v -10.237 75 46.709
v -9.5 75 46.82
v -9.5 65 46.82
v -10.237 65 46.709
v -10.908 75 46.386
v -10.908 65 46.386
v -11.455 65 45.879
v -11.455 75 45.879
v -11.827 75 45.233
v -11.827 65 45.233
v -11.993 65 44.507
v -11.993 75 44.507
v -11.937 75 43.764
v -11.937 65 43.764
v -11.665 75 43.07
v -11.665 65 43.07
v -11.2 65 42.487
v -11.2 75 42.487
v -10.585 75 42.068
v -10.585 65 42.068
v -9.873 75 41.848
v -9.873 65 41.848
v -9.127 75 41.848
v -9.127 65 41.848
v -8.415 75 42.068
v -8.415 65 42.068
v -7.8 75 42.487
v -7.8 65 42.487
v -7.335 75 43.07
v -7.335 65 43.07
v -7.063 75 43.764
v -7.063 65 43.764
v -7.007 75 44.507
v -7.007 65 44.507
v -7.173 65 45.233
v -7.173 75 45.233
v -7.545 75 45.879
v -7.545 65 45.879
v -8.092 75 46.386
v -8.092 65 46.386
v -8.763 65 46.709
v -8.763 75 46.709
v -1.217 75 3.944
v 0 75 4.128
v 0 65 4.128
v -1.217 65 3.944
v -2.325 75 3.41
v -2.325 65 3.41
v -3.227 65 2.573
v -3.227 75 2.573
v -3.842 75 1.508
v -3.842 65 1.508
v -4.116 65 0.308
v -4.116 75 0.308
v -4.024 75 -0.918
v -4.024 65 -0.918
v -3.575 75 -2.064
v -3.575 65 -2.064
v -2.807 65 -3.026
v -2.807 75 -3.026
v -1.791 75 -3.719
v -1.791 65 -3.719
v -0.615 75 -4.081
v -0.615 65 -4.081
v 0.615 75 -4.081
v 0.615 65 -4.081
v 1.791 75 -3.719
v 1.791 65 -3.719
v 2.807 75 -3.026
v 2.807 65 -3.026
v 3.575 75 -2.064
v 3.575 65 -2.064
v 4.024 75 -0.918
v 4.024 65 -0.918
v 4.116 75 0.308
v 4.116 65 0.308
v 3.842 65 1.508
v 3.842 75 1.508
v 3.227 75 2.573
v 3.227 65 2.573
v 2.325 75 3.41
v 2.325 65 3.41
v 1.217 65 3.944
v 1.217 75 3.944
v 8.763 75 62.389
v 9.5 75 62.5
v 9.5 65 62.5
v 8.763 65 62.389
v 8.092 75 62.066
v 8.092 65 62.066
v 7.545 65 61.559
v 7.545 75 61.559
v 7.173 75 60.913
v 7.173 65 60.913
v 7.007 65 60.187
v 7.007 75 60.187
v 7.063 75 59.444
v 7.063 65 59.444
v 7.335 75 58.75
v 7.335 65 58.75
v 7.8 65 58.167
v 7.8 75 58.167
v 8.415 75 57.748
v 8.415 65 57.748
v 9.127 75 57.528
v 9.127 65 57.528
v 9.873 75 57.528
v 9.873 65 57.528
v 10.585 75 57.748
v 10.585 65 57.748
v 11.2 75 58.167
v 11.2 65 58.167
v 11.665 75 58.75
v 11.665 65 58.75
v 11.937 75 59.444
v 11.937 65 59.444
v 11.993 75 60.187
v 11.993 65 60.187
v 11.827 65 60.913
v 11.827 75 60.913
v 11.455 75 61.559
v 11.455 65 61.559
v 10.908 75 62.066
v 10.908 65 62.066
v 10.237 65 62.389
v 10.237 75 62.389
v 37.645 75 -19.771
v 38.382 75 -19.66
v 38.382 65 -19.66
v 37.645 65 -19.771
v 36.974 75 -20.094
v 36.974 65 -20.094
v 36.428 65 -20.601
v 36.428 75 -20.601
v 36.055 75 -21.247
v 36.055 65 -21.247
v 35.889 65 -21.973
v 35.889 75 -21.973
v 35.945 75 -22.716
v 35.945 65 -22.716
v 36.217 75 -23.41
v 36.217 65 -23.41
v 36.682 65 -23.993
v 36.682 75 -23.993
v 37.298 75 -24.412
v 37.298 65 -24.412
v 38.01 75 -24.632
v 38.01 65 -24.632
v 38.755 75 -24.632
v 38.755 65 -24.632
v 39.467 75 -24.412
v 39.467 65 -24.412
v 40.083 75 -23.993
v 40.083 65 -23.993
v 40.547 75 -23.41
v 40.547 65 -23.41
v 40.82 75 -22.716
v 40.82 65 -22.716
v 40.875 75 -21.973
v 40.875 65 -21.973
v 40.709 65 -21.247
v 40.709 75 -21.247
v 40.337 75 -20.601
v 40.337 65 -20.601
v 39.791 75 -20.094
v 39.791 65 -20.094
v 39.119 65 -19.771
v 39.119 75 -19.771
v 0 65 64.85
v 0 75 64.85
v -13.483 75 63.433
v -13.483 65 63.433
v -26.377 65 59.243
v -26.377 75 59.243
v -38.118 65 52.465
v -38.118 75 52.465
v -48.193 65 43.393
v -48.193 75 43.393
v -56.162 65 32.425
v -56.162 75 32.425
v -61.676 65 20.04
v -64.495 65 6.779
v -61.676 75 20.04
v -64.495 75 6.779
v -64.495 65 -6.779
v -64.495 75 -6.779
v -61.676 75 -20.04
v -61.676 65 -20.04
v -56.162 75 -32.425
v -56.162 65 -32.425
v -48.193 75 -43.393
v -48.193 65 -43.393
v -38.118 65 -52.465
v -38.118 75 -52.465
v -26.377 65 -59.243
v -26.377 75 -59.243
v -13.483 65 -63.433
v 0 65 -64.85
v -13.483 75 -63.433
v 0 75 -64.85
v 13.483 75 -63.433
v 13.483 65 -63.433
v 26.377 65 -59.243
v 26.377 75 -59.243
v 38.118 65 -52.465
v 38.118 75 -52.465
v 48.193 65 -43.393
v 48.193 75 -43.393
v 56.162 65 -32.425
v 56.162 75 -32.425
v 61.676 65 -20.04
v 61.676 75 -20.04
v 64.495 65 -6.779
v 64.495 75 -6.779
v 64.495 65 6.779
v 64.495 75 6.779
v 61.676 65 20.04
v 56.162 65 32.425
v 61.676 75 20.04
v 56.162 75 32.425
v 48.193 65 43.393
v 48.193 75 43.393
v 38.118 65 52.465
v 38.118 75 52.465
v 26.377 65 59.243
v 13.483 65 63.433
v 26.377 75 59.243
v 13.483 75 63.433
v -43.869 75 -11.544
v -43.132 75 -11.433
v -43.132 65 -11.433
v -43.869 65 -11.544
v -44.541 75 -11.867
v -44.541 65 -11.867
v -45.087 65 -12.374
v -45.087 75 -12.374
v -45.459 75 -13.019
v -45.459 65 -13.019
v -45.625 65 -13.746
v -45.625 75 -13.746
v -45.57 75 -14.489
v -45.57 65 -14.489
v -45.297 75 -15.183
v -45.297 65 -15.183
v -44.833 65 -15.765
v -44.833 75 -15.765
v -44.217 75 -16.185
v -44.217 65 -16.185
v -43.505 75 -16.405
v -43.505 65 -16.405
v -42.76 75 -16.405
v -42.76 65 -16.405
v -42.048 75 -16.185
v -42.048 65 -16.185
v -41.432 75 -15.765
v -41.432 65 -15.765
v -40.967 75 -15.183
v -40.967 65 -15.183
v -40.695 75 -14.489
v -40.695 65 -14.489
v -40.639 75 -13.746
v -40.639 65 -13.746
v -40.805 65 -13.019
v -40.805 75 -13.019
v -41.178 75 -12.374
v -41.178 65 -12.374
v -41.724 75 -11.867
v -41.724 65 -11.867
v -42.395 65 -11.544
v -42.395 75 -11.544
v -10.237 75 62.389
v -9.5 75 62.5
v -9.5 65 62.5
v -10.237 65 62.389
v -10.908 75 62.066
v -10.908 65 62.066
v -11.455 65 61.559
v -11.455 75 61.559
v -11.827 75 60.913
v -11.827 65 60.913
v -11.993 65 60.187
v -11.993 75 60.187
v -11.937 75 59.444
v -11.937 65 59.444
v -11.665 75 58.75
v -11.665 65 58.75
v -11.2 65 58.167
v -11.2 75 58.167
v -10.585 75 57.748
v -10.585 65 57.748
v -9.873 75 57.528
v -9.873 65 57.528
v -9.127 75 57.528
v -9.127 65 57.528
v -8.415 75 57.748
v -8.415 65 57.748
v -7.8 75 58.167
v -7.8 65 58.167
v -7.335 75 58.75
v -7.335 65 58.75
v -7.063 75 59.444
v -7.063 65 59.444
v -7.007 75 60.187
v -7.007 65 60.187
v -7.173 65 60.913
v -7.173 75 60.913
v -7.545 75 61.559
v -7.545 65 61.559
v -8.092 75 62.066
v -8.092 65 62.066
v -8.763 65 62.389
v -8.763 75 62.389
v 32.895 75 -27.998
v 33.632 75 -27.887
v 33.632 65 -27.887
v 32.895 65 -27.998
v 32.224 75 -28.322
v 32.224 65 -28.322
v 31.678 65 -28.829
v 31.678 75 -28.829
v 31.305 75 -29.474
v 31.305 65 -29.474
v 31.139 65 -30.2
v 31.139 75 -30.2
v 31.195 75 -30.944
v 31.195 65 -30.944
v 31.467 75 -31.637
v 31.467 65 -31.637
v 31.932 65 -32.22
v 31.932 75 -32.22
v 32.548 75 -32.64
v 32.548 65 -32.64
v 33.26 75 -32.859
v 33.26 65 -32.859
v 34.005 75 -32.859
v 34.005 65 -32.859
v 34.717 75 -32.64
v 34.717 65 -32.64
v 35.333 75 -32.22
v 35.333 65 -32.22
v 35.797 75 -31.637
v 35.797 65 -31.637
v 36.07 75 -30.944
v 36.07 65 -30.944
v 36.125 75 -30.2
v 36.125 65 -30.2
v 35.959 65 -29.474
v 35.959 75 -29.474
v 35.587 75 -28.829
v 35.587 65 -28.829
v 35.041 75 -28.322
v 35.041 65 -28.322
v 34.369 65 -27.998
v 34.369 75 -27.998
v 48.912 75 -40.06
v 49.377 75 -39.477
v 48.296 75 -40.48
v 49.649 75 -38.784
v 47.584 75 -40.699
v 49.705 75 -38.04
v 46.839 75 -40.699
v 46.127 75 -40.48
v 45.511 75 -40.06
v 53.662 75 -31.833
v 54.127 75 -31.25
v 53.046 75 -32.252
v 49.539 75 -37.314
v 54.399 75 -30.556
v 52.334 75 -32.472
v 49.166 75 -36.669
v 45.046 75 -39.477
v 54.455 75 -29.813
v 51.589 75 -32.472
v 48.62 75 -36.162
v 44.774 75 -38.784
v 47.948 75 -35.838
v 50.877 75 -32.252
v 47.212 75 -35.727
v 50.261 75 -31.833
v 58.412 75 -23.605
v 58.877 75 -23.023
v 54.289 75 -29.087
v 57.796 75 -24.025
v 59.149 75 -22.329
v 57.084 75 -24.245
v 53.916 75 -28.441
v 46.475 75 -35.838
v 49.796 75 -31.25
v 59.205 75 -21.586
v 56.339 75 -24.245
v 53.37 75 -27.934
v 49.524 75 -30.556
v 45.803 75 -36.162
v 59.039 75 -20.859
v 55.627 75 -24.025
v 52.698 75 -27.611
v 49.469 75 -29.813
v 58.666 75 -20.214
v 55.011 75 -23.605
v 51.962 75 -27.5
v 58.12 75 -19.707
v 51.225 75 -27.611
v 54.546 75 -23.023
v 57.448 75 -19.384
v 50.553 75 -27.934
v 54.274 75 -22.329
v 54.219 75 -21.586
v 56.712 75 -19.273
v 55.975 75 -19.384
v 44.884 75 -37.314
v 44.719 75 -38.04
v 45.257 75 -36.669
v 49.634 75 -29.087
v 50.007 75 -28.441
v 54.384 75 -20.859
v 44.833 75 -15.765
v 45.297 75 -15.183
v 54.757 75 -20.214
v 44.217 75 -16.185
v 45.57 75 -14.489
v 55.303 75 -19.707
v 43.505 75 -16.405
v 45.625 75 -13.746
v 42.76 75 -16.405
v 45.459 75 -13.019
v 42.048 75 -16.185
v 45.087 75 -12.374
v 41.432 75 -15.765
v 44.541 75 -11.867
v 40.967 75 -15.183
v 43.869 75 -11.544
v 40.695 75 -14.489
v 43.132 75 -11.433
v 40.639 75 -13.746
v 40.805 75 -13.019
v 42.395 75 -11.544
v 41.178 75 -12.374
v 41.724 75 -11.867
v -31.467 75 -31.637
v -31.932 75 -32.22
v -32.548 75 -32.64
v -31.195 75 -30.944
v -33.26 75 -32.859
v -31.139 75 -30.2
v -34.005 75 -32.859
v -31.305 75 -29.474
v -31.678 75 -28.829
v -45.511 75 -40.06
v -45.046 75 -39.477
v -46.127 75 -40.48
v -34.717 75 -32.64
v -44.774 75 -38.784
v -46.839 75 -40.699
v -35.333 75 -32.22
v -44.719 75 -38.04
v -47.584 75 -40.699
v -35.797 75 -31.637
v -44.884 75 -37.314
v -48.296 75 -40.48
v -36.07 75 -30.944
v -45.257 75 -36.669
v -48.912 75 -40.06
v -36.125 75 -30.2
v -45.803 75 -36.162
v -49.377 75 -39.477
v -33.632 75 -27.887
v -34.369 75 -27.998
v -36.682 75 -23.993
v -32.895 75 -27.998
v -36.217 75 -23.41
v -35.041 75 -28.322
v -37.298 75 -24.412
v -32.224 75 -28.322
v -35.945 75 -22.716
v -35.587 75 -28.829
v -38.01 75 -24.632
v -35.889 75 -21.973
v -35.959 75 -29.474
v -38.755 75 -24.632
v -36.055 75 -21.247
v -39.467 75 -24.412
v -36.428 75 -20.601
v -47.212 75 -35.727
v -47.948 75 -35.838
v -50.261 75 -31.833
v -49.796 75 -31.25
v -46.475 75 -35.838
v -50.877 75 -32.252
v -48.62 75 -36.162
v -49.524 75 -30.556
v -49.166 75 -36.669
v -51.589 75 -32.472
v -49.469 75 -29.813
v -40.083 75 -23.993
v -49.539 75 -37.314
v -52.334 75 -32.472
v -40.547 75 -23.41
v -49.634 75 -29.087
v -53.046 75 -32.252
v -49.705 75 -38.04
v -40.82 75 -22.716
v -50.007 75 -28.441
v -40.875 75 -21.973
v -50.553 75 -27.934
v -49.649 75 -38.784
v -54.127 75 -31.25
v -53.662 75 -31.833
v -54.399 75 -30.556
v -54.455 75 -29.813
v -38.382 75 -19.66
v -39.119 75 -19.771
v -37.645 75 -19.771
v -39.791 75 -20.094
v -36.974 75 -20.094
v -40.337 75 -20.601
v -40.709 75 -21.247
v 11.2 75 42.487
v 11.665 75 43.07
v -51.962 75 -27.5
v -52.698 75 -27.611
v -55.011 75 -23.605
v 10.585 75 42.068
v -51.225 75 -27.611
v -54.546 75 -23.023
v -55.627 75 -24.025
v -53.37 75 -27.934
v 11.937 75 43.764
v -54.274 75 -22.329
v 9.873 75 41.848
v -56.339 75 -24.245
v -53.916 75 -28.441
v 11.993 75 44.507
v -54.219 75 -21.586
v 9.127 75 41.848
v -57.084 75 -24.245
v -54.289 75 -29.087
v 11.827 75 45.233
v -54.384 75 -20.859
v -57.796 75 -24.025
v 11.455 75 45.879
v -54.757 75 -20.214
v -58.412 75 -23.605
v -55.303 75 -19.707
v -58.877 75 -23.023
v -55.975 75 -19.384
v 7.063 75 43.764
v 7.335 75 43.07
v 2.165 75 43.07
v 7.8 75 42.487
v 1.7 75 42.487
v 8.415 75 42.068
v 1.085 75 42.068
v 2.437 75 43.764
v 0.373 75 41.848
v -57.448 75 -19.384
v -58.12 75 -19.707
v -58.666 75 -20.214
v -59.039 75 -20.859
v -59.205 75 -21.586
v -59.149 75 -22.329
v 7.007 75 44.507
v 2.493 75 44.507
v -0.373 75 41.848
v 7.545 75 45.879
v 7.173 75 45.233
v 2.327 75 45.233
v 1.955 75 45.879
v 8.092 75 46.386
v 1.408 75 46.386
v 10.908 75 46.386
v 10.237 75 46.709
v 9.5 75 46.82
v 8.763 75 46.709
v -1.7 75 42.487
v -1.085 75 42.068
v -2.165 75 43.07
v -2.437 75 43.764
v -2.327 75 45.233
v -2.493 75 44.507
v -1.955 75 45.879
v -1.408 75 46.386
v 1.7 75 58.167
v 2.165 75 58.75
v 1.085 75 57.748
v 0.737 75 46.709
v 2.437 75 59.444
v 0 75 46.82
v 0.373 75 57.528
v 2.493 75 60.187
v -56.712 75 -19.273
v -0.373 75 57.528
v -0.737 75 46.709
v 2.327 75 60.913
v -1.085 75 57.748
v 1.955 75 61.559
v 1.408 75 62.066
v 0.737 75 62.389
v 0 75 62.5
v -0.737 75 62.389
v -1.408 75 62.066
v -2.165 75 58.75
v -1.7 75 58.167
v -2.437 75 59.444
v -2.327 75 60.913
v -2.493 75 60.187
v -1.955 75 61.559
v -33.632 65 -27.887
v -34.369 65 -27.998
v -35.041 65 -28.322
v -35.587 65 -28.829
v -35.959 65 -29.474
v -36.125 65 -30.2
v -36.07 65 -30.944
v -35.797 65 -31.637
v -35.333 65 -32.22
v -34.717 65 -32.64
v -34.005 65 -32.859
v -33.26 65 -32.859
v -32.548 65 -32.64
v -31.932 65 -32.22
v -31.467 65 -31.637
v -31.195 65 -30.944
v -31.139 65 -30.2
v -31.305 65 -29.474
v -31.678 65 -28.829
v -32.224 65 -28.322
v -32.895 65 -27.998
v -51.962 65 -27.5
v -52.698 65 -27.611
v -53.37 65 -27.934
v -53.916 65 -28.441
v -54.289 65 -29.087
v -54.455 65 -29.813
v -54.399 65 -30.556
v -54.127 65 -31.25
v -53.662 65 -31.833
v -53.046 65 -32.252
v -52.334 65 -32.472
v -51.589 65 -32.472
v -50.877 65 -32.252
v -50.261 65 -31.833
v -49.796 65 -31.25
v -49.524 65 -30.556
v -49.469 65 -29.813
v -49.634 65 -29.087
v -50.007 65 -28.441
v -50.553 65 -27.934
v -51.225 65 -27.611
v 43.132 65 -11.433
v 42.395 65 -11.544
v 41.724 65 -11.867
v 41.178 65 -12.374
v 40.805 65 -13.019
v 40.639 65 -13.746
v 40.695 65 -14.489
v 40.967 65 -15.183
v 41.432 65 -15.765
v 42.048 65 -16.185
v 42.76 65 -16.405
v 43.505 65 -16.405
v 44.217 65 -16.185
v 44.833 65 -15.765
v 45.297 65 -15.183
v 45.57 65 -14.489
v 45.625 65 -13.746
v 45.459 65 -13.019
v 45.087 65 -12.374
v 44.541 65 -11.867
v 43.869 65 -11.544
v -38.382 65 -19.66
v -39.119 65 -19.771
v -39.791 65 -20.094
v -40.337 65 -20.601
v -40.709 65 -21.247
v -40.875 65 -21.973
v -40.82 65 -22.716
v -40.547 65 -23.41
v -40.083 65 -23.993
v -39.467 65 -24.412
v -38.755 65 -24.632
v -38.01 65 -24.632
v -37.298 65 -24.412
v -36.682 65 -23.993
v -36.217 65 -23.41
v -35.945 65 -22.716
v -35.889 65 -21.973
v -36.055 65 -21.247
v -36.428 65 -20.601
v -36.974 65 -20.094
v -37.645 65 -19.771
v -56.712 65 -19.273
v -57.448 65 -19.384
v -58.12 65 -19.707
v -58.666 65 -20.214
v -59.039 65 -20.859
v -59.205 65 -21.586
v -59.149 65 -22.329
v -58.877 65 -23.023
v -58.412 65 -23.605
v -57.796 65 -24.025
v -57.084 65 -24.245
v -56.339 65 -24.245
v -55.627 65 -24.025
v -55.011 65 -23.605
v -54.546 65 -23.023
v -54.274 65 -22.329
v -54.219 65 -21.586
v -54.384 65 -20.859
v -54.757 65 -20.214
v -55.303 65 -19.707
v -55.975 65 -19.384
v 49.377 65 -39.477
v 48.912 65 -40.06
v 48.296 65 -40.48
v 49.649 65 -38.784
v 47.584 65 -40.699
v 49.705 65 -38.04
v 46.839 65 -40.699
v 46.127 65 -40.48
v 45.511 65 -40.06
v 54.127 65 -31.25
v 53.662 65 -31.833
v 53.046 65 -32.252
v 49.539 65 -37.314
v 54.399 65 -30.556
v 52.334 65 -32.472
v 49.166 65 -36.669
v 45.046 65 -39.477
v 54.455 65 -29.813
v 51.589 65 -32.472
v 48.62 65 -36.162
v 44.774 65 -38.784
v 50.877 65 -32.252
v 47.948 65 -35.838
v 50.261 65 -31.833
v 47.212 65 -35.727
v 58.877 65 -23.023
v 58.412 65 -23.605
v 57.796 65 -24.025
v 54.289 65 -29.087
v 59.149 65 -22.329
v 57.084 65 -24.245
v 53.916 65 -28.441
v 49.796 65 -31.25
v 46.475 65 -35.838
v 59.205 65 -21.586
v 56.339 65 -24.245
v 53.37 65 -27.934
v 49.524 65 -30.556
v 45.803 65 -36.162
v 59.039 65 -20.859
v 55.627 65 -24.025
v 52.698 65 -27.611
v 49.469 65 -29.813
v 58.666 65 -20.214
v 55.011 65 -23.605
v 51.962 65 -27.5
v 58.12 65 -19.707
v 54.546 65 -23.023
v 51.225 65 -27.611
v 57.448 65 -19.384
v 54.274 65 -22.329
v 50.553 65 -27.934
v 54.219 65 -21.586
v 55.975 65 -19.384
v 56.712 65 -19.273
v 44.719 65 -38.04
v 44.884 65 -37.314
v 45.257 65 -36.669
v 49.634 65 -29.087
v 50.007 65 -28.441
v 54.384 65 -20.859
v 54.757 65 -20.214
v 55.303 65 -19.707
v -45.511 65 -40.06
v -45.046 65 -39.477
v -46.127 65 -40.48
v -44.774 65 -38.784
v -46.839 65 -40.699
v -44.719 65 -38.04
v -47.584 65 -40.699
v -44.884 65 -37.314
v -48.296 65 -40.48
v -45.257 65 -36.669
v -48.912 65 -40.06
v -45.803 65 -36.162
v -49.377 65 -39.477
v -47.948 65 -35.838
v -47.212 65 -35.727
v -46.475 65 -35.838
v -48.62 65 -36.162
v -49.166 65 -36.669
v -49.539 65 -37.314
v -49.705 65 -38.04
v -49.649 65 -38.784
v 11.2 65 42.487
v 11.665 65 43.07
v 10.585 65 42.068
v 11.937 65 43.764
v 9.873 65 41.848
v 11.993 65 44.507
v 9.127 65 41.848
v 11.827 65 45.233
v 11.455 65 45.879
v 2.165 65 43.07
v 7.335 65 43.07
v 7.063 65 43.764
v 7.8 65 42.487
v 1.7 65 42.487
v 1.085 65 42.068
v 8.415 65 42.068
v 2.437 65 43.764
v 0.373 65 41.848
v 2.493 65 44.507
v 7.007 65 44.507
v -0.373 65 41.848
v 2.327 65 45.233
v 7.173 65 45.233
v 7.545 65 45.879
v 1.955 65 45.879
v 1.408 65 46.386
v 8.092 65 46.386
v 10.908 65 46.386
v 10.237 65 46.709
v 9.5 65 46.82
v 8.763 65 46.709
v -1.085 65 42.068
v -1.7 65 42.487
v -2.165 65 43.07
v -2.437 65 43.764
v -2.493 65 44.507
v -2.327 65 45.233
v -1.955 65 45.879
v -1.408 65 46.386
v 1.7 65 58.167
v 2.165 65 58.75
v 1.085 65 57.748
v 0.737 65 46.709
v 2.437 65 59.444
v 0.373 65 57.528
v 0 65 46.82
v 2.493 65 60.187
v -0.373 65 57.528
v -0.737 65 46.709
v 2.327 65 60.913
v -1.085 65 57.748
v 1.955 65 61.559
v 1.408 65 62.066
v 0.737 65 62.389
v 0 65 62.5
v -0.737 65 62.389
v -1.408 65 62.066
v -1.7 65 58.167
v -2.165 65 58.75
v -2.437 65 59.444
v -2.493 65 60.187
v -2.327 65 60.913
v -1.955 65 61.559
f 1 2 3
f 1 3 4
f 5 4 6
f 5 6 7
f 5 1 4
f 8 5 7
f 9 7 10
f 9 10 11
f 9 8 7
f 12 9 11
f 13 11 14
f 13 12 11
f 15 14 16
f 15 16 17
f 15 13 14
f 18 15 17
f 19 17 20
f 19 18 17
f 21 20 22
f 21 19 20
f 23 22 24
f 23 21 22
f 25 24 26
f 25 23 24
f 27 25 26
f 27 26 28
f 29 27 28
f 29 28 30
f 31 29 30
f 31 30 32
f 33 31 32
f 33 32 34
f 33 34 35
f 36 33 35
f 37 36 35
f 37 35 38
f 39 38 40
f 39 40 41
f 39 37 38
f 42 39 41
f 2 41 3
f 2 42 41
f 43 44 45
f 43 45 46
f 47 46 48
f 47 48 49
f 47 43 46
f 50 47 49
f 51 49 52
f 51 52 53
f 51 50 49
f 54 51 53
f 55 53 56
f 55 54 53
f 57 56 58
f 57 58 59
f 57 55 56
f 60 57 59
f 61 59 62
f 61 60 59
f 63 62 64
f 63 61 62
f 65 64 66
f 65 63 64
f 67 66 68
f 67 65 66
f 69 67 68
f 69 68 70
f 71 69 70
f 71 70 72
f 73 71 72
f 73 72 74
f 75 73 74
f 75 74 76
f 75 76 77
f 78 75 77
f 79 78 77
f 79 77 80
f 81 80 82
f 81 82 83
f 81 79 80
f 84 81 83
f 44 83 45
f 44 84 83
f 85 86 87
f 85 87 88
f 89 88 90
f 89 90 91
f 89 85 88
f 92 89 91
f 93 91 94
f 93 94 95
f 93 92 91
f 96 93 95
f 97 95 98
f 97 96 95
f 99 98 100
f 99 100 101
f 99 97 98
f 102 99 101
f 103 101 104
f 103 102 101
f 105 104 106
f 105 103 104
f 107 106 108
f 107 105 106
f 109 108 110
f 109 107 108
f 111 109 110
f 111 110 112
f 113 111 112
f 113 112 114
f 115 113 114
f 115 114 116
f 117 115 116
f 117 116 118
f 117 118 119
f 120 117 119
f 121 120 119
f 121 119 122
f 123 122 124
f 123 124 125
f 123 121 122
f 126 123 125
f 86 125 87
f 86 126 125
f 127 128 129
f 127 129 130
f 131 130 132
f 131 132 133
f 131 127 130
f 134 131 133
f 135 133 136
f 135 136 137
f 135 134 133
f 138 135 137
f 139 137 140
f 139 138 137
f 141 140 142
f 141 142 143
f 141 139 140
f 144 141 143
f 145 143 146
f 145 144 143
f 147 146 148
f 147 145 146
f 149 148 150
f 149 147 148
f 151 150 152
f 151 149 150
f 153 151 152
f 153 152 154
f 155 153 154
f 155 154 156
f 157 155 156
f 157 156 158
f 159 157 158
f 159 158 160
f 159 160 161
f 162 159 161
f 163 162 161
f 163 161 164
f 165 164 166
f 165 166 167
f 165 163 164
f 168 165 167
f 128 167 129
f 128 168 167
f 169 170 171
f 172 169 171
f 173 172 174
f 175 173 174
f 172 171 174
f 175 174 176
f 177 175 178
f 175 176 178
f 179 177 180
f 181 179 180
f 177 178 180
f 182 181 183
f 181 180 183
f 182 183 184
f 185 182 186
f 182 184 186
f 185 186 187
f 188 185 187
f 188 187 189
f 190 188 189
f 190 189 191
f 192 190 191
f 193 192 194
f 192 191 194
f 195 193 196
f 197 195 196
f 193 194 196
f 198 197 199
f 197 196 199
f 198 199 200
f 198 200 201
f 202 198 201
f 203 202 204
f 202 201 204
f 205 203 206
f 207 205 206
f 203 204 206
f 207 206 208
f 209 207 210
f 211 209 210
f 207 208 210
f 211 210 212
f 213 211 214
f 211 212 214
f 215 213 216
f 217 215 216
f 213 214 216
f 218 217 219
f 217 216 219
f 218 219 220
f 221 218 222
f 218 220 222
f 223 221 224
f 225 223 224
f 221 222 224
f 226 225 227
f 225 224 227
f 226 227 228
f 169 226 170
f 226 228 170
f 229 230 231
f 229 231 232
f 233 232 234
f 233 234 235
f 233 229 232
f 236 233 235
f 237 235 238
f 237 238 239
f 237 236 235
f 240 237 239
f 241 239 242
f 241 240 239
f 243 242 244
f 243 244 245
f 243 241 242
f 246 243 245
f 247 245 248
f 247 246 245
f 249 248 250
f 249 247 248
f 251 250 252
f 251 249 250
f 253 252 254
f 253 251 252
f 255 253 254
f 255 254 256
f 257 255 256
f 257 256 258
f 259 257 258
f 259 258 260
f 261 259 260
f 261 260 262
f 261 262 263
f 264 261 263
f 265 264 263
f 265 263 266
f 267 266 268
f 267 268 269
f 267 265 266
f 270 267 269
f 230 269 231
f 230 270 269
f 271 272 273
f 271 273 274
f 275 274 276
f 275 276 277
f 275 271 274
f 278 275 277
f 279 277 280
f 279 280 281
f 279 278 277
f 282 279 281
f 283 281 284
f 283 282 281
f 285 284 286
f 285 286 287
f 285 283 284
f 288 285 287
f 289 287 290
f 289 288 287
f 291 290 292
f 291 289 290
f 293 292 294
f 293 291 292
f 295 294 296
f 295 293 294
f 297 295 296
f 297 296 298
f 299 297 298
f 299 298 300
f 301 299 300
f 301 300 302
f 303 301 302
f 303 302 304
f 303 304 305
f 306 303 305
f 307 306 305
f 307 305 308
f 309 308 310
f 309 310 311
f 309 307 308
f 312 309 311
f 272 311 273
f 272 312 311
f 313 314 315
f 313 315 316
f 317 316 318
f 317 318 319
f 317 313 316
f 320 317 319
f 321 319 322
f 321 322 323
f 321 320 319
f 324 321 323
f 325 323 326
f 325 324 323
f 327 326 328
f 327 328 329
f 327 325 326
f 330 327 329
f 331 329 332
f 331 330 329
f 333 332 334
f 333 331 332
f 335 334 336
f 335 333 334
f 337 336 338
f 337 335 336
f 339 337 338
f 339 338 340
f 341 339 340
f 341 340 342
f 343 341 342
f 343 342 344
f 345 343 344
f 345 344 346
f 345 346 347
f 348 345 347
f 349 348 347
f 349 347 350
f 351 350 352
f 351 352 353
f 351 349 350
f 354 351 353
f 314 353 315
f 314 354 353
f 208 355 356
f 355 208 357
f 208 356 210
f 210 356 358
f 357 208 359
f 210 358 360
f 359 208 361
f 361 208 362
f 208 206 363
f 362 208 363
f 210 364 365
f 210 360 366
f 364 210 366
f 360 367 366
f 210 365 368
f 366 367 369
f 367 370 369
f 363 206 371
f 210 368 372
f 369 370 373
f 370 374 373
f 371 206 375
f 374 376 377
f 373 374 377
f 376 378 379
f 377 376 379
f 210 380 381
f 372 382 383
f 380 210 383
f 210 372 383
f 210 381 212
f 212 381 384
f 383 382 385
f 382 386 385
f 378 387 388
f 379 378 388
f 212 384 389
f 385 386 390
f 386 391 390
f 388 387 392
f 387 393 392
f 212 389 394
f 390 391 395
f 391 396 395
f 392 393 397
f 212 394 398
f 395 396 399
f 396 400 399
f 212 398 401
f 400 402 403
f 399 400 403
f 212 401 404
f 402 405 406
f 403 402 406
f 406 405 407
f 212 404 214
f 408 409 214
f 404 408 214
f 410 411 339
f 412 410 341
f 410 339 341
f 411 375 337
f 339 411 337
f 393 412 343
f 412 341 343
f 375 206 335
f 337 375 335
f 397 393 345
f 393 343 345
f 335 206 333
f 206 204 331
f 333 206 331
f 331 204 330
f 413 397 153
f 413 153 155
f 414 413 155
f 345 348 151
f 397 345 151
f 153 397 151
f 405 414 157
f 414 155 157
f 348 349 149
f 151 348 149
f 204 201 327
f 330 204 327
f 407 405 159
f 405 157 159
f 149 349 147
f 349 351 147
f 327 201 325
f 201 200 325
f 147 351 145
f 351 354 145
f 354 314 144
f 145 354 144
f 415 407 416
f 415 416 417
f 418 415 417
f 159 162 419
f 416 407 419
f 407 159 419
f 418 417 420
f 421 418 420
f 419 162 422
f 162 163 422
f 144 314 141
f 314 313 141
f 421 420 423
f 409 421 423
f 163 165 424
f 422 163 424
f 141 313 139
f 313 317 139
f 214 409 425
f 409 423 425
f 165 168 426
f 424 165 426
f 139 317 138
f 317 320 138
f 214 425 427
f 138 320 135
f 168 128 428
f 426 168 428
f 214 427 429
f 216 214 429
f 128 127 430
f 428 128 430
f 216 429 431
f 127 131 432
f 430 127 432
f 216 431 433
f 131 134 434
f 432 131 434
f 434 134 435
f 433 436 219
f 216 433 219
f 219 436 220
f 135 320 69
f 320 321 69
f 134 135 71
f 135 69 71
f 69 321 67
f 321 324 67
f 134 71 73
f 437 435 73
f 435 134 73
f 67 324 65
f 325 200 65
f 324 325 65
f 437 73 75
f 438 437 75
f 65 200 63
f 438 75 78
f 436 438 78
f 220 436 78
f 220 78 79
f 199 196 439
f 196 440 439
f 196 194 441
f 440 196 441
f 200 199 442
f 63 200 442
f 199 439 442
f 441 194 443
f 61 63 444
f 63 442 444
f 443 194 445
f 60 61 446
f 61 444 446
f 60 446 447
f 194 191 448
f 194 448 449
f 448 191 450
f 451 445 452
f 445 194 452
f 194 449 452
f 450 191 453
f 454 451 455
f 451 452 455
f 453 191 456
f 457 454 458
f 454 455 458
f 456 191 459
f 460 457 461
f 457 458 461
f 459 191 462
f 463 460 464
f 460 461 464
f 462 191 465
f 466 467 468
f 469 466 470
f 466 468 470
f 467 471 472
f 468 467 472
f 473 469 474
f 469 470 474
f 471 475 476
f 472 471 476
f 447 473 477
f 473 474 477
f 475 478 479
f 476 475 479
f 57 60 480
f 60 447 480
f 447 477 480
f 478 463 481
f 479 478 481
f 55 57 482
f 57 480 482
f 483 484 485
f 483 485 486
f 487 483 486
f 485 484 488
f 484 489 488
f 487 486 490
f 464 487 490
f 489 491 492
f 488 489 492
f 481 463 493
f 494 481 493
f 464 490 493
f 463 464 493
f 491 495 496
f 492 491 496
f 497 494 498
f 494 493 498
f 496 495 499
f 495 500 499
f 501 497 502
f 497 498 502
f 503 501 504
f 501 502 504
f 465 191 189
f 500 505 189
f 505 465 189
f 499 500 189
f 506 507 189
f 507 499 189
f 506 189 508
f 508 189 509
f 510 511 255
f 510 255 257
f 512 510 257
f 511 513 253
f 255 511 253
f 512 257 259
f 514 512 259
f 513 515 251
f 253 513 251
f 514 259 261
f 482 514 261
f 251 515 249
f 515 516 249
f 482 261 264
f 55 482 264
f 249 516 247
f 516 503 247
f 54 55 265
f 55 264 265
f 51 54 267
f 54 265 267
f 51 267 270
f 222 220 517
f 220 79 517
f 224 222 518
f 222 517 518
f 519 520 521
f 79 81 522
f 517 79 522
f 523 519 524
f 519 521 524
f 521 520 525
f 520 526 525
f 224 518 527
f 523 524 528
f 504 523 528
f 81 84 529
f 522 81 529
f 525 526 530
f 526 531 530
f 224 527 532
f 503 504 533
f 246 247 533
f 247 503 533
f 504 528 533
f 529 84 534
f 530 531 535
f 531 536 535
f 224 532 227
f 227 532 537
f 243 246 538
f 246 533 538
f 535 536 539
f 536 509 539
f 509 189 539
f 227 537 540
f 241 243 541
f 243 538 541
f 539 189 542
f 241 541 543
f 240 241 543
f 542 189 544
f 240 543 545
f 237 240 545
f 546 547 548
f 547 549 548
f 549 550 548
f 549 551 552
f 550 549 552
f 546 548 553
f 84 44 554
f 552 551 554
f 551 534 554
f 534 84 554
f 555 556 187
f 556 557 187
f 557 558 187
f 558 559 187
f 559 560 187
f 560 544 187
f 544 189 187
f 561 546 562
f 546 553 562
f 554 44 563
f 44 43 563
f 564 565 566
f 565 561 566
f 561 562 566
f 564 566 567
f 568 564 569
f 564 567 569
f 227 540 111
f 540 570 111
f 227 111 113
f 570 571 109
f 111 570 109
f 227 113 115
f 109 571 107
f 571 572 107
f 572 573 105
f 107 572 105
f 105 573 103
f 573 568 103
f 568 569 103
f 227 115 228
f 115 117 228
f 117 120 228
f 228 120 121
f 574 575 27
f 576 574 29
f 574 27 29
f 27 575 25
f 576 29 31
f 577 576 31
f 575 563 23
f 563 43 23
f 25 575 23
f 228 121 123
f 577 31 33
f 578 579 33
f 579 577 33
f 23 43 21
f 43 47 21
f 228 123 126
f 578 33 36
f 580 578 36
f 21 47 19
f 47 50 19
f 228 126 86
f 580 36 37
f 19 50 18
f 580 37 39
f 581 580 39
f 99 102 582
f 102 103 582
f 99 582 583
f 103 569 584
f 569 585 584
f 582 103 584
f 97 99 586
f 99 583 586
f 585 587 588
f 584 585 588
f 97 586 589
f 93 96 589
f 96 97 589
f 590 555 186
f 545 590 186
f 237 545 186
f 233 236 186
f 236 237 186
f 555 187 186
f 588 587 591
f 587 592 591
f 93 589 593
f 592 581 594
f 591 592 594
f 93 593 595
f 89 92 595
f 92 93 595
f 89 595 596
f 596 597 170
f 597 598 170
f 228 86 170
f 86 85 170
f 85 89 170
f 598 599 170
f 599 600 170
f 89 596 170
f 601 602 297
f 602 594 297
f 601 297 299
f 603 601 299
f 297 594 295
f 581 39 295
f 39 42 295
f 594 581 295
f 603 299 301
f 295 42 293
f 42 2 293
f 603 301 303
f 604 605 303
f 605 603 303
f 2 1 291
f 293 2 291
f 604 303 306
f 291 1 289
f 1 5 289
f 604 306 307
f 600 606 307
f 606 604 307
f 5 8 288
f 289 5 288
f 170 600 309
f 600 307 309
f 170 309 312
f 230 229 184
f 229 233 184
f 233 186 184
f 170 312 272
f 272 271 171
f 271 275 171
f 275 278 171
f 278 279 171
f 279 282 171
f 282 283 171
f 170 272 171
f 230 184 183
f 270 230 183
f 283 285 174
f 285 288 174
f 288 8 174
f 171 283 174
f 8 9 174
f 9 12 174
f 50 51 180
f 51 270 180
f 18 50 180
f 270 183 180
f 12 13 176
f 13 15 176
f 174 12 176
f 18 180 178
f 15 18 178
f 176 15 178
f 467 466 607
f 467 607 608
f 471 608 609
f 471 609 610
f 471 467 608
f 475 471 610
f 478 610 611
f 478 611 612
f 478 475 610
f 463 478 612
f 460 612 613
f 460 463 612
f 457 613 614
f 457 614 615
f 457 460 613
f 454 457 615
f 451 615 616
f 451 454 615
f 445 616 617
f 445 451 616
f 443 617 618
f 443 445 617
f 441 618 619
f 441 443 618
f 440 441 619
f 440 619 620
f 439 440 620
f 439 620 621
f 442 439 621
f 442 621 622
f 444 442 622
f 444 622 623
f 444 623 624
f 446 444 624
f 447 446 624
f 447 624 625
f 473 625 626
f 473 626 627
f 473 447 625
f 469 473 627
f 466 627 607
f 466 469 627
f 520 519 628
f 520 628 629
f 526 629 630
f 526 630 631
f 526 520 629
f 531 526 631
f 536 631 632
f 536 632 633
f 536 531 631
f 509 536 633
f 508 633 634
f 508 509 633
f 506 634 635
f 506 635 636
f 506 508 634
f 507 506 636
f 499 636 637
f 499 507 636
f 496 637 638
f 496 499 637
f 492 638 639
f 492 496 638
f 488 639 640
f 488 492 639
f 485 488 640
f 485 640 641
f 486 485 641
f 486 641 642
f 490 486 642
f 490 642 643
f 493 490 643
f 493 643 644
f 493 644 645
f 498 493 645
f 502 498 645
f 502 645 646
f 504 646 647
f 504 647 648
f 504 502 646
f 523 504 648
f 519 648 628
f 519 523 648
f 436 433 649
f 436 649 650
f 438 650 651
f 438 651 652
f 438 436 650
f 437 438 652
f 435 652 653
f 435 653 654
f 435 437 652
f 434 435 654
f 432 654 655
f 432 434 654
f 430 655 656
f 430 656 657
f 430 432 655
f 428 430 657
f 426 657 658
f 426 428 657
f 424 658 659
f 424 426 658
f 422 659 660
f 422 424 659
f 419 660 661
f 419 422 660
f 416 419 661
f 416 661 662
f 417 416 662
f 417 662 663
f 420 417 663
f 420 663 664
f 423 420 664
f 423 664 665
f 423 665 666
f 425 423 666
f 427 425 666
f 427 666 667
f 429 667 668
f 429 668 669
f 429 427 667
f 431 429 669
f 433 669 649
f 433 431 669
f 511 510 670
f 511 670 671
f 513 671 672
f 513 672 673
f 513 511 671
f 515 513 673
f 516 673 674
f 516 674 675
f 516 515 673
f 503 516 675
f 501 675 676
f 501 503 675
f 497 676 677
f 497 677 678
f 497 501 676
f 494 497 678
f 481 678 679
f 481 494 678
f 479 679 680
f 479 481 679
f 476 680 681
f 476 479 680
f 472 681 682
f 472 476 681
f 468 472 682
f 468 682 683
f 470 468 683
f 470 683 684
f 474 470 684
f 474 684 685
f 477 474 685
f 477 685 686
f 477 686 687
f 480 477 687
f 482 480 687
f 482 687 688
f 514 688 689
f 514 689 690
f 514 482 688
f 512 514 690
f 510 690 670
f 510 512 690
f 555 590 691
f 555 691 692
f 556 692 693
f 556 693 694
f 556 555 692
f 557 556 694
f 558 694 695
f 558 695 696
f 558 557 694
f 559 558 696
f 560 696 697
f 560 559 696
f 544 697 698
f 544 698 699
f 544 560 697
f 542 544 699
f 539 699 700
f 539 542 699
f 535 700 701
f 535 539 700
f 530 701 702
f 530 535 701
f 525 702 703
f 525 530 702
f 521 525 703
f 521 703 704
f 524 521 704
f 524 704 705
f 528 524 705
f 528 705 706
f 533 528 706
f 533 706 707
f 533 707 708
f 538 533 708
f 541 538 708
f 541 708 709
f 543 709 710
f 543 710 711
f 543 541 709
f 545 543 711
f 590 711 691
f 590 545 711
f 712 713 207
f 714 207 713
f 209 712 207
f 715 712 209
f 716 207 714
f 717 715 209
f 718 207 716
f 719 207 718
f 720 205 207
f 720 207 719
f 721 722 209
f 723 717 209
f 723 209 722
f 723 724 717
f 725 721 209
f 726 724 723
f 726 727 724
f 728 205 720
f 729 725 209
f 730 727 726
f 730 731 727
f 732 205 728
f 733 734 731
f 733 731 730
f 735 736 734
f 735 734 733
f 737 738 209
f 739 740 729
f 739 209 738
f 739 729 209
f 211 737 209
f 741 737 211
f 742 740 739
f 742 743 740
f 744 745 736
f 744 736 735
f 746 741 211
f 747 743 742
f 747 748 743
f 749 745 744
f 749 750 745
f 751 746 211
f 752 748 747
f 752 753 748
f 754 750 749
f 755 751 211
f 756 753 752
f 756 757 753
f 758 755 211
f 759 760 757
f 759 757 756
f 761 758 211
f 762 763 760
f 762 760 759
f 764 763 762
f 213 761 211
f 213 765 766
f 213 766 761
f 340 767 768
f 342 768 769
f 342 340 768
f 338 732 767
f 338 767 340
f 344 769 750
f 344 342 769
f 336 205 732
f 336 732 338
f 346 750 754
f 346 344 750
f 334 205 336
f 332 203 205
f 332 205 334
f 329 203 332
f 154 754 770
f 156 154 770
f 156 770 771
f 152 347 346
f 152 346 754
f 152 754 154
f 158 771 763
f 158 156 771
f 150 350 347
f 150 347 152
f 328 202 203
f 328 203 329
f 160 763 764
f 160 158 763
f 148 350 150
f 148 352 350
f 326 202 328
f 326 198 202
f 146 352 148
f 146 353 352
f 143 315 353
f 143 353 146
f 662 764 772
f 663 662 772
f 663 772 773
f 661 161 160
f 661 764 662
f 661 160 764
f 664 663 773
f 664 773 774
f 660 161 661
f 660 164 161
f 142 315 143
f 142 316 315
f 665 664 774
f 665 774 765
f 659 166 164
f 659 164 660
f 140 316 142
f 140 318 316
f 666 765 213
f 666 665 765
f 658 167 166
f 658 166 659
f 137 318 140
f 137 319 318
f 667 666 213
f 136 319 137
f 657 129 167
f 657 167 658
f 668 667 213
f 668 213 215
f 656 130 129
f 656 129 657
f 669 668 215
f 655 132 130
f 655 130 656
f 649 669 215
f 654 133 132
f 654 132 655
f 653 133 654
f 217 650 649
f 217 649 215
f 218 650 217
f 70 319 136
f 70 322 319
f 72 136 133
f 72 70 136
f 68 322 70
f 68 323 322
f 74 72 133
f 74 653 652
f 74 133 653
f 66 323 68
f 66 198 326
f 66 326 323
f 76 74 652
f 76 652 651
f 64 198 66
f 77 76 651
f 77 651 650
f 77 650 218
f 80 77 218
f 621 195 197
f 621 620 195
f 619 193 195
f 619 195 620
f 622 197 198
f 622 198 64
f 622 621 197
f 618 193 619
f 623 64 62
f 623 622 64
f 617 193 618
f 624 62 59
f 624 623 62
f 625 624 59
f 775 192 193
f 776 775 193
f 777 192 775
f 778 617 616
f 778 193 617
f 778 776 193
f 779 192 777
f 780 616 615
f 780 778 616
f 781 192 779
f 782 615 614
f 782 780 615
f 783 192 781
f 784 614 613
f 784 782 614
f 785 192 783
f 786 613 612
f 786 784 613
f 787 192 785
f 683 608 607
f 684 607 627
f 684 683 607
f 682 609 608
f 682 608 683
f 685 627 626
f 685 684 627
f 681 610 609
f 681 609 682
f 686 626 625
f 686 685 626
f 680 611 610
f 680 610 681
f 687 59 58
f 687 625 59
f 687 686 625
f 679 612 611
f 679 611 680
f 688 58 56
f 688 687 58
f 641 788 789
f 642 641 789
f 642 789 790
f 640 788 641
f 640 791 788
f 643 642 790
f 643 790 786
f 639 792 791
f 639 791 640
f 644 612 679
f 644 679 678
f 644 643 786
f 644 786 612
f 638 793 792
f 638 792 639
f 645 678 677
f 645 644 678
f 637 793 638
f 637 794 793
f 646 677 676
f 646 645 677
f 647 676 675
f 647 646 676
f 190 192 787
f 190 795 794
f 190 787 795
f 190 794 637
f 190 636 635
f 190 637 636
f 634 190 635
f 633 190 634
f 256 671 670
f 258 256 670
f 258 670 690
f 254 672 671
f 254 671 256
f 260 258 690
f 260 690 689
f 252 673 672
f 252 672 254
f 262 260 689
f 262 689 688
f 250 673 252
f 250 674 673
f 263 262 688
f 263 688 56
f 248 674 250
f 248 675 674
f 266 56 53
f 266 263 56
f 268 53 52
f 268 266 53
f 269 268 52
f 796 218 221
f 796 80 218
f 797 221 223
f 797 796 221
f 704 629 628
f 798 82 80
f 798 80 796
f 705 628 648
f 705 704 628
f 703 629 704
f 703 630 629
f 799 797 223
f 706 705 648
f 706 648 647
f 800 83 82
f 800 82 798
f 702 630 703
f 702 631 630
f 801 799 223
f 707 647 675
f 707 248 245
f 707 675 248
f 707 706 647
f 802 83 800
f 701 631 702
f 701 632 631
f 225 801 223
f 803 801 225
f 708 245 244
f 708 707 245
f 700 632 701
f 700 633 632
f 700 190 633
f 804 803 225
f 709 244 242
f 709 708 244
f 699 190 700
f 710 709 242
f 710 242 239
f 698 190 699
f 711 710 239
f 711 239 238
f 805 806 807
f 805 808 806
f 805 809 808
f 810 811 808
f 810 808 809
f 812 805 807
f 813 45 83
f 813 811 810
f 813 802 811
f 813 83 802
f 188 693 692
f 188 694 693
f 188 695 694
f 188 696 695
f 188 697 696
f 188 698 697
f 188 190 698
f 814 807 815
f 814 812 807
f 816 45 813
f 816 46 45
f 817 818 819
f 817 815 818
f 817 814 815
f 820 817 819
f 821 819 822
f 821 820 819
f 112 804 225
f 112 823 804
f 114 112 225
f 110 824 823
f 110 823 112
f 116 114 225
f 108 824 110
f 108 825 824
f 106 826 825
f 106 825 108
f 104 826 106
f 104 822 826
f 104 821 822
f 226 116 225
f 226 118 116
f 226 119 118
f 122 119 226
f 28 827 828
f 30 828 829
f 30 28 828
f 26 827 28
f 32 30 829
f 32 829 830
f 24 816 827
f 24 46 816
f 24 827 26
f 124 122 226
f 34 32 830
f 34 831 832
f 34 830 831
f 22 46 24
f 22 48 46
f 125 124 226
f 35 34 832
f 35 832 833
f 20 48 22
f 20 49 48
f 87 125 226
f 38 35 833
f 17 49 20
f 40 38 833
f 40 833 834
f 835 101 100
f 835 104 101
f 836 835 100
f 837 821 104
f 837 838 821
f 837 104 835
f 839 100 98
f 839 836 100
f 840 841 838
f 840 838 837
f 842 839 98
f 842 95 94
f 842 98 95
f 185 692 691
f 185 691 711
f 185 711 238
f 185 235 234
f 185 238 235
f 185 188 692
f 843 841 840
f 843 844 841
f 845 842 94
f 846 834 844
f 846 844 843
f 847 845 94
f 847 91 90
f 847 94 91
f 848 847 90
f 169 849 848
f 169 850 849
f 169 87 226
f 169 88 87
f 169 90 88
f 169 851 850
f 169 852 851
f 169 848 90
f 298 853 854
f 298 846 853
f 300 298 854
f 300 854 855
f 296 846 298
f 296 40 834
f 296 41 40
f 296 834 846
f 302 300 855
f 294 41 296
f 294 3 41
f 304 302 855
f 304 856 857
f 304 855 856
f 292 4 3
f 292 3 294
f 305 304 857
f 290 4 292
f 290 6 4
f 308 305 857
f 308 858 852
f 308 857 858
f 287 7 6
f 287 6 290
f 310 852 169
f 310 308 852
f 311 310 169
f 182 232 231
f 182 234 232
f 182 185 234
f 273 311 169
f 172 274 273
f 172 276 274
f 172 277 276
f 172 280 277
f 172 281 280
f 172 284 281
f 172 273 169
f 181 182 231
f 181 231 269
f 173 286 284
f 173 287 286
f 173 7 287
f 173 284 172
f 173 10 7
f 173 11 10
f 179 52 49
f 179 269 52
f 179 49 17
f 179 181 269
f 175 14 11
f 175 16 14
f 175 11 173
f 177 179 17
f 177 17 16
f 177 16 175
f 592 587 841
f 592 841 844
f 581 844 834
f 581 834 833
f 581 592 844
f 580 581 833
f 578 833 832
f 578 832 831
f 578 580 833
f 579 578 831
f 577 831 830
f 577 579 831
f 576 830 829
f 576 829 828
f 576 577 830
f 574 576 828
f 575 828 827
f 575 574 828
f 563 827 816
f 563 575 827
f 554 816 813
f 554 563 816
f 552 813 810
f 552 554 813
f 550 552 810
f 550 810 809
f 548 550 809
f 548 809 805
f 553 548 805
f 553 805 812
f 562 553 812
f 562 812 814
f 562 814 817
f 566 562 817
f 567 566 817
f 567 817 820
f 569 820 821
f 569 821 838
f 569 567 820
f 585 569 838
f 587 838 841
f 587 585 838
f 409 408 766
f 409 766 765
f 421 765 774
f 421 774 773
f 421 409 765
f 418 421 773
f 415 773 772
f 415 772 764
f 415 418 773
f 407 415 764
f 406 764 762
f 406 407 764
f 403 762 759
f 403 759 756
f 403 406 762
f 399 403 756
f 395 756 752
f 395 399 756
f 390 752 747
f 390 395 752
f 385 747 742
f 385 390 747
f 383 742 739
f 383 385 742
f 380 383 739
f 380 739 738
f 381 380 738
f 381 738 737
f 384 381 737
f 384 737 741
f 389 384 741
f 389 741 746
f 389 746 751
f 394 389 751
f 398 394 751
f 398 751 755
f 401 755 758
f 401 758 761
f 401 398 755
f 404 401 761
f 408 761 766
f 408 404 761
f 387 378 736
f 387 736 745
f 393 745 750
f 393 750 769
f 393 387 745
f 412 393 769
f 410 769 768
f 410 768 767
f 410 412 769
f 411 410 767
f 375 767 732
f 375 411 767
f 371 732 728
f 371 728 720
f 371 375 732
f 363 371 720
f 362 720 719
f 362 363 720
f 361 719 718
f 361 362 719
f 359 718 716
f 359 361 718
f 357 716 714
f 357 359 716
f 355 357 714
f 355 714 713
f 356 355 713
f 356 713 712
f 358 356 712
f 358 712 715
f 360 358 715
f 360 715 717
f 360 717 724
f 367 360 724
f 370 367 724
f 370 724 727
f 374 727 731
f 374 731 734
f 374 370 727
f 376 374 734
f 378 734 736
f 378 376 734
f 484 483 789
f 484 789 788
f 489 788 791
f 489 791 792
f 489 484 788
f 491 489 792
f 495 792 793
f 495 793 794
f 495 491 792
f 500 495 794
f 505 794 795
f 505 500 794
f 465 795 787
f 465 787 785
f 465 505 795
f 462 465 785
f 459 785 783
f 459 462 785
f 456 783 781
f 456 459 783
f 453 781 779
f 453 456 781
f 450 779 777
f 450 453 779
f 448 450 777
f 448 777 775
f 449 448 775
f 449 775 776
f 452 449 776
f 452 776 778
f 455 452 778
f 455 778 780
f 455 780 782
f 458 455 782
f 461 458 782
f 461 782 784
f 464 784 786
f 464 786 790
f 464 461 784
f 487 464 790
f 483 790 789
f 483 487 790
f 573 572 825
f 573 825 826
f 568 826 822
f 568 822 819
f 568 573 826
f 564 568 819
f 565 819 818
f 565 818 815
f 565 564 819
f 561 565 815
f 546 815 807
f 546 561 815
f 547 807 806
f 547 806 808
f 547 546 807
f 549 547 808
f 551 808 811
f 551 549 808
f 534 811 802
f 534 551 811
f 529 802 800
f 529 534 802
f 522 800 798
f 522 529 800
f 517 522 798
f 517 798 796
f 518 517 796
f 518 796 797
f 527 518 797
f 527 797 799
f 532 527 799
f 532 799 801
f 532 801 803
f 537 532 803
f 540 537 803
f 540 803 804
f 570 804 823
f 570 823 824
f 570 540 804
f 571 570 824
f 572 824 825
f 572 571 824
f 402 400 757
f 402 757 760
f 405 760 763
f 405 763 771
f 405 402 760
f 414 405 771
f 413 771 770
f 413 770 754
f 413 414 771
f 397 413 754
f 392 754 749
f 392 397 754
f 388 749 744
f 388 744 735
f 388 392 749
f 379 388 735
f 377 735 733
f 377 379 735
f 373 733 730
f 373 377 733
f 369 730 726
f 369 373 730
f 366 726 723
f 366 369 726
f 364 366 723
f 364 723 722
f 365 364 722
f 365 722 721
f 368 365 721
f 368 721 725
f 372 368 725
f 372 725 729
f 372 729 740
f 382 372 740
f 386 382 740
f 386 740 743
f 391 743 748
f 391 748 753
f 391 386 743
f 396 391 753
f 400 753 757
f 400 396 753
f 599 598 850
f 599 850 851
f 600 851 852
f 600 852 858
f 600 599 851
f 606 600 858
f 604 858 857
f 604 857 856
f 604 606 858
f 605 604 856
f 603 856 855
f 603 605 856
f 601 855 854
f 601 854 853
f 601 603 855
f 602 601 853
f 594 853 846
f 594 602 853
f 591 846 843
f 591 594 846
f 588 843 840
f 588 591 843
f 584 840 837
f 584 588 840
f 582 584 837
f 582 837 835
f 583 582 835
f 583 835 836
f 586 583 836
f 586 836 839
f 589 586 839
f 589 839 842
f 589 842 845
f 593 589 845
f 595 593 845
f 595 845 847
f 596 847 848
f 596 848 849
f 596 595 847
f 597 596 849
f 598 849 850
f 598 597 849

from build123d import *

# Parameters (mm, degrees)
SKETCH16_R          = 64.85
SKETCH16_R_2        = 2.5
SKETCH16_R_3        = 4.1275
BOSS_EXTRUDE1_DEPTH = 10


with BuildPart() as part:
    # Sketch16 → Boss-Extrude1 (new body)
    with BuildSketch(Plane.XZ.offset(-75)):
        with Locations(Location((0, 0, 0), (0, 0, 90))):
            Circle(SKETCH16_R)
        with Locations(Location((38.382245896, -22.16, 0), (0, 0, 90))):
            Circle(SKETCH16_R_2, mode=Mode.SUBTRACT)
        with Locations(Location((51.961524227, -30, 0), (0, 0, 90))):
            Circle(SKETCH16_R_2, mode=Mode.SUBTRACT)
        with Locations(Location((-43.132245896, -13.932758664, 0), (0, 0, 90))):
            Circle(SKETCH16_R_2, mode=Mode.SUBTRACT)
        with Locations(Location((-38.382245896, -22.16, 0), (0, 0, 90))):
            Circle(SKETCH16_R_2, mode=Mode.SUBTRACT)
        with Locations(Location((-51.961524227, -30, 0), (0, 0, 90))):
            Circle(SKETCH16_R_2, mode=Mode.SUBTRACT)
        with Locations(Location((0, 44.32, 0), (0, 0, 90))):
            Circle(SKETCH16_R_2, mode=Mode.SUBTRACT)
        with Locations(Location((0, 60, 0), (0, 0, 90))):
            Circle(SKETCH16_R_2, mode=Mode.SUBTRACT)
        with Locations(Location((-33.632245896, -30.387241336, 0), (0, 0, 90))):
            Circle(SKETCH16_R_2, mode=Mode.SUBTRACT)
        with Locations(Location((-47.211524227, -38.227241336, 0), (0, 0, 90))):
            Circle(SKETCH16_R_2, mode=Mode.SUBTRACT)
        with Locations(Location((-56.711524227, -21.772758664, 0), (0, 0, 90))):
            Circle(SKETCH16_R_2, mode=Mode.SUBTRACT)
        with Locations(Location((9.5, 44.32, 0), (0, 0, 90))):
            Circle(SKETCH16_R_2, mode=Mode.SUBTRACT)
        with Locations(Location((-9.5, 44.32, 0), (0, 0, 90))):
            Circle(SKETCH16_R_2, mode=Mode.SUBTRACT)
        with Locations(Location((-9.5, 60, 0), (0, 0, 90))):
            Circle(SKETCH16_R_2, mode=Mode.SUBTRACT)
        with Locations(Location((9.5, 60, 0), (0, 0, 90))):
            Circle(SKETCH16_R_2, mode=Mode.SUBTRACT)
        with Locations(Location((33.632245896, -30.387241336, 0), (0, 0, 90))):
            Circle(SKETCH16_R_2, mode=Mode.SUBTRACT)
        with Locations(Location((43.132245896, -13.932758664, 0), (0, 0, 90))):
            Circle(SKETCH16_R_2, mode=Mode.SUBTRACT)
        with Locations(Location((56.711524227, -21.772758664, 0), (0, 0, 90))):
            Circle(SKETCH16_R_2, mode=Mode.SUBTRACT)
        with Locations(Location((47.211524227, -38.227241336, 0), (0, 0, 90))):
            Circle(SKETCH16_R_2, mode=Mode.SUBTRACT)
        with Locations(Location((0, 0, 0), (0, 0, 90))):
            Circle(SKETCH16_R_3, mode=Mode.SUBTRACT)
    extrude(amount=BOSS_EXTRUDE1_DEPTH)


solid = part.part
